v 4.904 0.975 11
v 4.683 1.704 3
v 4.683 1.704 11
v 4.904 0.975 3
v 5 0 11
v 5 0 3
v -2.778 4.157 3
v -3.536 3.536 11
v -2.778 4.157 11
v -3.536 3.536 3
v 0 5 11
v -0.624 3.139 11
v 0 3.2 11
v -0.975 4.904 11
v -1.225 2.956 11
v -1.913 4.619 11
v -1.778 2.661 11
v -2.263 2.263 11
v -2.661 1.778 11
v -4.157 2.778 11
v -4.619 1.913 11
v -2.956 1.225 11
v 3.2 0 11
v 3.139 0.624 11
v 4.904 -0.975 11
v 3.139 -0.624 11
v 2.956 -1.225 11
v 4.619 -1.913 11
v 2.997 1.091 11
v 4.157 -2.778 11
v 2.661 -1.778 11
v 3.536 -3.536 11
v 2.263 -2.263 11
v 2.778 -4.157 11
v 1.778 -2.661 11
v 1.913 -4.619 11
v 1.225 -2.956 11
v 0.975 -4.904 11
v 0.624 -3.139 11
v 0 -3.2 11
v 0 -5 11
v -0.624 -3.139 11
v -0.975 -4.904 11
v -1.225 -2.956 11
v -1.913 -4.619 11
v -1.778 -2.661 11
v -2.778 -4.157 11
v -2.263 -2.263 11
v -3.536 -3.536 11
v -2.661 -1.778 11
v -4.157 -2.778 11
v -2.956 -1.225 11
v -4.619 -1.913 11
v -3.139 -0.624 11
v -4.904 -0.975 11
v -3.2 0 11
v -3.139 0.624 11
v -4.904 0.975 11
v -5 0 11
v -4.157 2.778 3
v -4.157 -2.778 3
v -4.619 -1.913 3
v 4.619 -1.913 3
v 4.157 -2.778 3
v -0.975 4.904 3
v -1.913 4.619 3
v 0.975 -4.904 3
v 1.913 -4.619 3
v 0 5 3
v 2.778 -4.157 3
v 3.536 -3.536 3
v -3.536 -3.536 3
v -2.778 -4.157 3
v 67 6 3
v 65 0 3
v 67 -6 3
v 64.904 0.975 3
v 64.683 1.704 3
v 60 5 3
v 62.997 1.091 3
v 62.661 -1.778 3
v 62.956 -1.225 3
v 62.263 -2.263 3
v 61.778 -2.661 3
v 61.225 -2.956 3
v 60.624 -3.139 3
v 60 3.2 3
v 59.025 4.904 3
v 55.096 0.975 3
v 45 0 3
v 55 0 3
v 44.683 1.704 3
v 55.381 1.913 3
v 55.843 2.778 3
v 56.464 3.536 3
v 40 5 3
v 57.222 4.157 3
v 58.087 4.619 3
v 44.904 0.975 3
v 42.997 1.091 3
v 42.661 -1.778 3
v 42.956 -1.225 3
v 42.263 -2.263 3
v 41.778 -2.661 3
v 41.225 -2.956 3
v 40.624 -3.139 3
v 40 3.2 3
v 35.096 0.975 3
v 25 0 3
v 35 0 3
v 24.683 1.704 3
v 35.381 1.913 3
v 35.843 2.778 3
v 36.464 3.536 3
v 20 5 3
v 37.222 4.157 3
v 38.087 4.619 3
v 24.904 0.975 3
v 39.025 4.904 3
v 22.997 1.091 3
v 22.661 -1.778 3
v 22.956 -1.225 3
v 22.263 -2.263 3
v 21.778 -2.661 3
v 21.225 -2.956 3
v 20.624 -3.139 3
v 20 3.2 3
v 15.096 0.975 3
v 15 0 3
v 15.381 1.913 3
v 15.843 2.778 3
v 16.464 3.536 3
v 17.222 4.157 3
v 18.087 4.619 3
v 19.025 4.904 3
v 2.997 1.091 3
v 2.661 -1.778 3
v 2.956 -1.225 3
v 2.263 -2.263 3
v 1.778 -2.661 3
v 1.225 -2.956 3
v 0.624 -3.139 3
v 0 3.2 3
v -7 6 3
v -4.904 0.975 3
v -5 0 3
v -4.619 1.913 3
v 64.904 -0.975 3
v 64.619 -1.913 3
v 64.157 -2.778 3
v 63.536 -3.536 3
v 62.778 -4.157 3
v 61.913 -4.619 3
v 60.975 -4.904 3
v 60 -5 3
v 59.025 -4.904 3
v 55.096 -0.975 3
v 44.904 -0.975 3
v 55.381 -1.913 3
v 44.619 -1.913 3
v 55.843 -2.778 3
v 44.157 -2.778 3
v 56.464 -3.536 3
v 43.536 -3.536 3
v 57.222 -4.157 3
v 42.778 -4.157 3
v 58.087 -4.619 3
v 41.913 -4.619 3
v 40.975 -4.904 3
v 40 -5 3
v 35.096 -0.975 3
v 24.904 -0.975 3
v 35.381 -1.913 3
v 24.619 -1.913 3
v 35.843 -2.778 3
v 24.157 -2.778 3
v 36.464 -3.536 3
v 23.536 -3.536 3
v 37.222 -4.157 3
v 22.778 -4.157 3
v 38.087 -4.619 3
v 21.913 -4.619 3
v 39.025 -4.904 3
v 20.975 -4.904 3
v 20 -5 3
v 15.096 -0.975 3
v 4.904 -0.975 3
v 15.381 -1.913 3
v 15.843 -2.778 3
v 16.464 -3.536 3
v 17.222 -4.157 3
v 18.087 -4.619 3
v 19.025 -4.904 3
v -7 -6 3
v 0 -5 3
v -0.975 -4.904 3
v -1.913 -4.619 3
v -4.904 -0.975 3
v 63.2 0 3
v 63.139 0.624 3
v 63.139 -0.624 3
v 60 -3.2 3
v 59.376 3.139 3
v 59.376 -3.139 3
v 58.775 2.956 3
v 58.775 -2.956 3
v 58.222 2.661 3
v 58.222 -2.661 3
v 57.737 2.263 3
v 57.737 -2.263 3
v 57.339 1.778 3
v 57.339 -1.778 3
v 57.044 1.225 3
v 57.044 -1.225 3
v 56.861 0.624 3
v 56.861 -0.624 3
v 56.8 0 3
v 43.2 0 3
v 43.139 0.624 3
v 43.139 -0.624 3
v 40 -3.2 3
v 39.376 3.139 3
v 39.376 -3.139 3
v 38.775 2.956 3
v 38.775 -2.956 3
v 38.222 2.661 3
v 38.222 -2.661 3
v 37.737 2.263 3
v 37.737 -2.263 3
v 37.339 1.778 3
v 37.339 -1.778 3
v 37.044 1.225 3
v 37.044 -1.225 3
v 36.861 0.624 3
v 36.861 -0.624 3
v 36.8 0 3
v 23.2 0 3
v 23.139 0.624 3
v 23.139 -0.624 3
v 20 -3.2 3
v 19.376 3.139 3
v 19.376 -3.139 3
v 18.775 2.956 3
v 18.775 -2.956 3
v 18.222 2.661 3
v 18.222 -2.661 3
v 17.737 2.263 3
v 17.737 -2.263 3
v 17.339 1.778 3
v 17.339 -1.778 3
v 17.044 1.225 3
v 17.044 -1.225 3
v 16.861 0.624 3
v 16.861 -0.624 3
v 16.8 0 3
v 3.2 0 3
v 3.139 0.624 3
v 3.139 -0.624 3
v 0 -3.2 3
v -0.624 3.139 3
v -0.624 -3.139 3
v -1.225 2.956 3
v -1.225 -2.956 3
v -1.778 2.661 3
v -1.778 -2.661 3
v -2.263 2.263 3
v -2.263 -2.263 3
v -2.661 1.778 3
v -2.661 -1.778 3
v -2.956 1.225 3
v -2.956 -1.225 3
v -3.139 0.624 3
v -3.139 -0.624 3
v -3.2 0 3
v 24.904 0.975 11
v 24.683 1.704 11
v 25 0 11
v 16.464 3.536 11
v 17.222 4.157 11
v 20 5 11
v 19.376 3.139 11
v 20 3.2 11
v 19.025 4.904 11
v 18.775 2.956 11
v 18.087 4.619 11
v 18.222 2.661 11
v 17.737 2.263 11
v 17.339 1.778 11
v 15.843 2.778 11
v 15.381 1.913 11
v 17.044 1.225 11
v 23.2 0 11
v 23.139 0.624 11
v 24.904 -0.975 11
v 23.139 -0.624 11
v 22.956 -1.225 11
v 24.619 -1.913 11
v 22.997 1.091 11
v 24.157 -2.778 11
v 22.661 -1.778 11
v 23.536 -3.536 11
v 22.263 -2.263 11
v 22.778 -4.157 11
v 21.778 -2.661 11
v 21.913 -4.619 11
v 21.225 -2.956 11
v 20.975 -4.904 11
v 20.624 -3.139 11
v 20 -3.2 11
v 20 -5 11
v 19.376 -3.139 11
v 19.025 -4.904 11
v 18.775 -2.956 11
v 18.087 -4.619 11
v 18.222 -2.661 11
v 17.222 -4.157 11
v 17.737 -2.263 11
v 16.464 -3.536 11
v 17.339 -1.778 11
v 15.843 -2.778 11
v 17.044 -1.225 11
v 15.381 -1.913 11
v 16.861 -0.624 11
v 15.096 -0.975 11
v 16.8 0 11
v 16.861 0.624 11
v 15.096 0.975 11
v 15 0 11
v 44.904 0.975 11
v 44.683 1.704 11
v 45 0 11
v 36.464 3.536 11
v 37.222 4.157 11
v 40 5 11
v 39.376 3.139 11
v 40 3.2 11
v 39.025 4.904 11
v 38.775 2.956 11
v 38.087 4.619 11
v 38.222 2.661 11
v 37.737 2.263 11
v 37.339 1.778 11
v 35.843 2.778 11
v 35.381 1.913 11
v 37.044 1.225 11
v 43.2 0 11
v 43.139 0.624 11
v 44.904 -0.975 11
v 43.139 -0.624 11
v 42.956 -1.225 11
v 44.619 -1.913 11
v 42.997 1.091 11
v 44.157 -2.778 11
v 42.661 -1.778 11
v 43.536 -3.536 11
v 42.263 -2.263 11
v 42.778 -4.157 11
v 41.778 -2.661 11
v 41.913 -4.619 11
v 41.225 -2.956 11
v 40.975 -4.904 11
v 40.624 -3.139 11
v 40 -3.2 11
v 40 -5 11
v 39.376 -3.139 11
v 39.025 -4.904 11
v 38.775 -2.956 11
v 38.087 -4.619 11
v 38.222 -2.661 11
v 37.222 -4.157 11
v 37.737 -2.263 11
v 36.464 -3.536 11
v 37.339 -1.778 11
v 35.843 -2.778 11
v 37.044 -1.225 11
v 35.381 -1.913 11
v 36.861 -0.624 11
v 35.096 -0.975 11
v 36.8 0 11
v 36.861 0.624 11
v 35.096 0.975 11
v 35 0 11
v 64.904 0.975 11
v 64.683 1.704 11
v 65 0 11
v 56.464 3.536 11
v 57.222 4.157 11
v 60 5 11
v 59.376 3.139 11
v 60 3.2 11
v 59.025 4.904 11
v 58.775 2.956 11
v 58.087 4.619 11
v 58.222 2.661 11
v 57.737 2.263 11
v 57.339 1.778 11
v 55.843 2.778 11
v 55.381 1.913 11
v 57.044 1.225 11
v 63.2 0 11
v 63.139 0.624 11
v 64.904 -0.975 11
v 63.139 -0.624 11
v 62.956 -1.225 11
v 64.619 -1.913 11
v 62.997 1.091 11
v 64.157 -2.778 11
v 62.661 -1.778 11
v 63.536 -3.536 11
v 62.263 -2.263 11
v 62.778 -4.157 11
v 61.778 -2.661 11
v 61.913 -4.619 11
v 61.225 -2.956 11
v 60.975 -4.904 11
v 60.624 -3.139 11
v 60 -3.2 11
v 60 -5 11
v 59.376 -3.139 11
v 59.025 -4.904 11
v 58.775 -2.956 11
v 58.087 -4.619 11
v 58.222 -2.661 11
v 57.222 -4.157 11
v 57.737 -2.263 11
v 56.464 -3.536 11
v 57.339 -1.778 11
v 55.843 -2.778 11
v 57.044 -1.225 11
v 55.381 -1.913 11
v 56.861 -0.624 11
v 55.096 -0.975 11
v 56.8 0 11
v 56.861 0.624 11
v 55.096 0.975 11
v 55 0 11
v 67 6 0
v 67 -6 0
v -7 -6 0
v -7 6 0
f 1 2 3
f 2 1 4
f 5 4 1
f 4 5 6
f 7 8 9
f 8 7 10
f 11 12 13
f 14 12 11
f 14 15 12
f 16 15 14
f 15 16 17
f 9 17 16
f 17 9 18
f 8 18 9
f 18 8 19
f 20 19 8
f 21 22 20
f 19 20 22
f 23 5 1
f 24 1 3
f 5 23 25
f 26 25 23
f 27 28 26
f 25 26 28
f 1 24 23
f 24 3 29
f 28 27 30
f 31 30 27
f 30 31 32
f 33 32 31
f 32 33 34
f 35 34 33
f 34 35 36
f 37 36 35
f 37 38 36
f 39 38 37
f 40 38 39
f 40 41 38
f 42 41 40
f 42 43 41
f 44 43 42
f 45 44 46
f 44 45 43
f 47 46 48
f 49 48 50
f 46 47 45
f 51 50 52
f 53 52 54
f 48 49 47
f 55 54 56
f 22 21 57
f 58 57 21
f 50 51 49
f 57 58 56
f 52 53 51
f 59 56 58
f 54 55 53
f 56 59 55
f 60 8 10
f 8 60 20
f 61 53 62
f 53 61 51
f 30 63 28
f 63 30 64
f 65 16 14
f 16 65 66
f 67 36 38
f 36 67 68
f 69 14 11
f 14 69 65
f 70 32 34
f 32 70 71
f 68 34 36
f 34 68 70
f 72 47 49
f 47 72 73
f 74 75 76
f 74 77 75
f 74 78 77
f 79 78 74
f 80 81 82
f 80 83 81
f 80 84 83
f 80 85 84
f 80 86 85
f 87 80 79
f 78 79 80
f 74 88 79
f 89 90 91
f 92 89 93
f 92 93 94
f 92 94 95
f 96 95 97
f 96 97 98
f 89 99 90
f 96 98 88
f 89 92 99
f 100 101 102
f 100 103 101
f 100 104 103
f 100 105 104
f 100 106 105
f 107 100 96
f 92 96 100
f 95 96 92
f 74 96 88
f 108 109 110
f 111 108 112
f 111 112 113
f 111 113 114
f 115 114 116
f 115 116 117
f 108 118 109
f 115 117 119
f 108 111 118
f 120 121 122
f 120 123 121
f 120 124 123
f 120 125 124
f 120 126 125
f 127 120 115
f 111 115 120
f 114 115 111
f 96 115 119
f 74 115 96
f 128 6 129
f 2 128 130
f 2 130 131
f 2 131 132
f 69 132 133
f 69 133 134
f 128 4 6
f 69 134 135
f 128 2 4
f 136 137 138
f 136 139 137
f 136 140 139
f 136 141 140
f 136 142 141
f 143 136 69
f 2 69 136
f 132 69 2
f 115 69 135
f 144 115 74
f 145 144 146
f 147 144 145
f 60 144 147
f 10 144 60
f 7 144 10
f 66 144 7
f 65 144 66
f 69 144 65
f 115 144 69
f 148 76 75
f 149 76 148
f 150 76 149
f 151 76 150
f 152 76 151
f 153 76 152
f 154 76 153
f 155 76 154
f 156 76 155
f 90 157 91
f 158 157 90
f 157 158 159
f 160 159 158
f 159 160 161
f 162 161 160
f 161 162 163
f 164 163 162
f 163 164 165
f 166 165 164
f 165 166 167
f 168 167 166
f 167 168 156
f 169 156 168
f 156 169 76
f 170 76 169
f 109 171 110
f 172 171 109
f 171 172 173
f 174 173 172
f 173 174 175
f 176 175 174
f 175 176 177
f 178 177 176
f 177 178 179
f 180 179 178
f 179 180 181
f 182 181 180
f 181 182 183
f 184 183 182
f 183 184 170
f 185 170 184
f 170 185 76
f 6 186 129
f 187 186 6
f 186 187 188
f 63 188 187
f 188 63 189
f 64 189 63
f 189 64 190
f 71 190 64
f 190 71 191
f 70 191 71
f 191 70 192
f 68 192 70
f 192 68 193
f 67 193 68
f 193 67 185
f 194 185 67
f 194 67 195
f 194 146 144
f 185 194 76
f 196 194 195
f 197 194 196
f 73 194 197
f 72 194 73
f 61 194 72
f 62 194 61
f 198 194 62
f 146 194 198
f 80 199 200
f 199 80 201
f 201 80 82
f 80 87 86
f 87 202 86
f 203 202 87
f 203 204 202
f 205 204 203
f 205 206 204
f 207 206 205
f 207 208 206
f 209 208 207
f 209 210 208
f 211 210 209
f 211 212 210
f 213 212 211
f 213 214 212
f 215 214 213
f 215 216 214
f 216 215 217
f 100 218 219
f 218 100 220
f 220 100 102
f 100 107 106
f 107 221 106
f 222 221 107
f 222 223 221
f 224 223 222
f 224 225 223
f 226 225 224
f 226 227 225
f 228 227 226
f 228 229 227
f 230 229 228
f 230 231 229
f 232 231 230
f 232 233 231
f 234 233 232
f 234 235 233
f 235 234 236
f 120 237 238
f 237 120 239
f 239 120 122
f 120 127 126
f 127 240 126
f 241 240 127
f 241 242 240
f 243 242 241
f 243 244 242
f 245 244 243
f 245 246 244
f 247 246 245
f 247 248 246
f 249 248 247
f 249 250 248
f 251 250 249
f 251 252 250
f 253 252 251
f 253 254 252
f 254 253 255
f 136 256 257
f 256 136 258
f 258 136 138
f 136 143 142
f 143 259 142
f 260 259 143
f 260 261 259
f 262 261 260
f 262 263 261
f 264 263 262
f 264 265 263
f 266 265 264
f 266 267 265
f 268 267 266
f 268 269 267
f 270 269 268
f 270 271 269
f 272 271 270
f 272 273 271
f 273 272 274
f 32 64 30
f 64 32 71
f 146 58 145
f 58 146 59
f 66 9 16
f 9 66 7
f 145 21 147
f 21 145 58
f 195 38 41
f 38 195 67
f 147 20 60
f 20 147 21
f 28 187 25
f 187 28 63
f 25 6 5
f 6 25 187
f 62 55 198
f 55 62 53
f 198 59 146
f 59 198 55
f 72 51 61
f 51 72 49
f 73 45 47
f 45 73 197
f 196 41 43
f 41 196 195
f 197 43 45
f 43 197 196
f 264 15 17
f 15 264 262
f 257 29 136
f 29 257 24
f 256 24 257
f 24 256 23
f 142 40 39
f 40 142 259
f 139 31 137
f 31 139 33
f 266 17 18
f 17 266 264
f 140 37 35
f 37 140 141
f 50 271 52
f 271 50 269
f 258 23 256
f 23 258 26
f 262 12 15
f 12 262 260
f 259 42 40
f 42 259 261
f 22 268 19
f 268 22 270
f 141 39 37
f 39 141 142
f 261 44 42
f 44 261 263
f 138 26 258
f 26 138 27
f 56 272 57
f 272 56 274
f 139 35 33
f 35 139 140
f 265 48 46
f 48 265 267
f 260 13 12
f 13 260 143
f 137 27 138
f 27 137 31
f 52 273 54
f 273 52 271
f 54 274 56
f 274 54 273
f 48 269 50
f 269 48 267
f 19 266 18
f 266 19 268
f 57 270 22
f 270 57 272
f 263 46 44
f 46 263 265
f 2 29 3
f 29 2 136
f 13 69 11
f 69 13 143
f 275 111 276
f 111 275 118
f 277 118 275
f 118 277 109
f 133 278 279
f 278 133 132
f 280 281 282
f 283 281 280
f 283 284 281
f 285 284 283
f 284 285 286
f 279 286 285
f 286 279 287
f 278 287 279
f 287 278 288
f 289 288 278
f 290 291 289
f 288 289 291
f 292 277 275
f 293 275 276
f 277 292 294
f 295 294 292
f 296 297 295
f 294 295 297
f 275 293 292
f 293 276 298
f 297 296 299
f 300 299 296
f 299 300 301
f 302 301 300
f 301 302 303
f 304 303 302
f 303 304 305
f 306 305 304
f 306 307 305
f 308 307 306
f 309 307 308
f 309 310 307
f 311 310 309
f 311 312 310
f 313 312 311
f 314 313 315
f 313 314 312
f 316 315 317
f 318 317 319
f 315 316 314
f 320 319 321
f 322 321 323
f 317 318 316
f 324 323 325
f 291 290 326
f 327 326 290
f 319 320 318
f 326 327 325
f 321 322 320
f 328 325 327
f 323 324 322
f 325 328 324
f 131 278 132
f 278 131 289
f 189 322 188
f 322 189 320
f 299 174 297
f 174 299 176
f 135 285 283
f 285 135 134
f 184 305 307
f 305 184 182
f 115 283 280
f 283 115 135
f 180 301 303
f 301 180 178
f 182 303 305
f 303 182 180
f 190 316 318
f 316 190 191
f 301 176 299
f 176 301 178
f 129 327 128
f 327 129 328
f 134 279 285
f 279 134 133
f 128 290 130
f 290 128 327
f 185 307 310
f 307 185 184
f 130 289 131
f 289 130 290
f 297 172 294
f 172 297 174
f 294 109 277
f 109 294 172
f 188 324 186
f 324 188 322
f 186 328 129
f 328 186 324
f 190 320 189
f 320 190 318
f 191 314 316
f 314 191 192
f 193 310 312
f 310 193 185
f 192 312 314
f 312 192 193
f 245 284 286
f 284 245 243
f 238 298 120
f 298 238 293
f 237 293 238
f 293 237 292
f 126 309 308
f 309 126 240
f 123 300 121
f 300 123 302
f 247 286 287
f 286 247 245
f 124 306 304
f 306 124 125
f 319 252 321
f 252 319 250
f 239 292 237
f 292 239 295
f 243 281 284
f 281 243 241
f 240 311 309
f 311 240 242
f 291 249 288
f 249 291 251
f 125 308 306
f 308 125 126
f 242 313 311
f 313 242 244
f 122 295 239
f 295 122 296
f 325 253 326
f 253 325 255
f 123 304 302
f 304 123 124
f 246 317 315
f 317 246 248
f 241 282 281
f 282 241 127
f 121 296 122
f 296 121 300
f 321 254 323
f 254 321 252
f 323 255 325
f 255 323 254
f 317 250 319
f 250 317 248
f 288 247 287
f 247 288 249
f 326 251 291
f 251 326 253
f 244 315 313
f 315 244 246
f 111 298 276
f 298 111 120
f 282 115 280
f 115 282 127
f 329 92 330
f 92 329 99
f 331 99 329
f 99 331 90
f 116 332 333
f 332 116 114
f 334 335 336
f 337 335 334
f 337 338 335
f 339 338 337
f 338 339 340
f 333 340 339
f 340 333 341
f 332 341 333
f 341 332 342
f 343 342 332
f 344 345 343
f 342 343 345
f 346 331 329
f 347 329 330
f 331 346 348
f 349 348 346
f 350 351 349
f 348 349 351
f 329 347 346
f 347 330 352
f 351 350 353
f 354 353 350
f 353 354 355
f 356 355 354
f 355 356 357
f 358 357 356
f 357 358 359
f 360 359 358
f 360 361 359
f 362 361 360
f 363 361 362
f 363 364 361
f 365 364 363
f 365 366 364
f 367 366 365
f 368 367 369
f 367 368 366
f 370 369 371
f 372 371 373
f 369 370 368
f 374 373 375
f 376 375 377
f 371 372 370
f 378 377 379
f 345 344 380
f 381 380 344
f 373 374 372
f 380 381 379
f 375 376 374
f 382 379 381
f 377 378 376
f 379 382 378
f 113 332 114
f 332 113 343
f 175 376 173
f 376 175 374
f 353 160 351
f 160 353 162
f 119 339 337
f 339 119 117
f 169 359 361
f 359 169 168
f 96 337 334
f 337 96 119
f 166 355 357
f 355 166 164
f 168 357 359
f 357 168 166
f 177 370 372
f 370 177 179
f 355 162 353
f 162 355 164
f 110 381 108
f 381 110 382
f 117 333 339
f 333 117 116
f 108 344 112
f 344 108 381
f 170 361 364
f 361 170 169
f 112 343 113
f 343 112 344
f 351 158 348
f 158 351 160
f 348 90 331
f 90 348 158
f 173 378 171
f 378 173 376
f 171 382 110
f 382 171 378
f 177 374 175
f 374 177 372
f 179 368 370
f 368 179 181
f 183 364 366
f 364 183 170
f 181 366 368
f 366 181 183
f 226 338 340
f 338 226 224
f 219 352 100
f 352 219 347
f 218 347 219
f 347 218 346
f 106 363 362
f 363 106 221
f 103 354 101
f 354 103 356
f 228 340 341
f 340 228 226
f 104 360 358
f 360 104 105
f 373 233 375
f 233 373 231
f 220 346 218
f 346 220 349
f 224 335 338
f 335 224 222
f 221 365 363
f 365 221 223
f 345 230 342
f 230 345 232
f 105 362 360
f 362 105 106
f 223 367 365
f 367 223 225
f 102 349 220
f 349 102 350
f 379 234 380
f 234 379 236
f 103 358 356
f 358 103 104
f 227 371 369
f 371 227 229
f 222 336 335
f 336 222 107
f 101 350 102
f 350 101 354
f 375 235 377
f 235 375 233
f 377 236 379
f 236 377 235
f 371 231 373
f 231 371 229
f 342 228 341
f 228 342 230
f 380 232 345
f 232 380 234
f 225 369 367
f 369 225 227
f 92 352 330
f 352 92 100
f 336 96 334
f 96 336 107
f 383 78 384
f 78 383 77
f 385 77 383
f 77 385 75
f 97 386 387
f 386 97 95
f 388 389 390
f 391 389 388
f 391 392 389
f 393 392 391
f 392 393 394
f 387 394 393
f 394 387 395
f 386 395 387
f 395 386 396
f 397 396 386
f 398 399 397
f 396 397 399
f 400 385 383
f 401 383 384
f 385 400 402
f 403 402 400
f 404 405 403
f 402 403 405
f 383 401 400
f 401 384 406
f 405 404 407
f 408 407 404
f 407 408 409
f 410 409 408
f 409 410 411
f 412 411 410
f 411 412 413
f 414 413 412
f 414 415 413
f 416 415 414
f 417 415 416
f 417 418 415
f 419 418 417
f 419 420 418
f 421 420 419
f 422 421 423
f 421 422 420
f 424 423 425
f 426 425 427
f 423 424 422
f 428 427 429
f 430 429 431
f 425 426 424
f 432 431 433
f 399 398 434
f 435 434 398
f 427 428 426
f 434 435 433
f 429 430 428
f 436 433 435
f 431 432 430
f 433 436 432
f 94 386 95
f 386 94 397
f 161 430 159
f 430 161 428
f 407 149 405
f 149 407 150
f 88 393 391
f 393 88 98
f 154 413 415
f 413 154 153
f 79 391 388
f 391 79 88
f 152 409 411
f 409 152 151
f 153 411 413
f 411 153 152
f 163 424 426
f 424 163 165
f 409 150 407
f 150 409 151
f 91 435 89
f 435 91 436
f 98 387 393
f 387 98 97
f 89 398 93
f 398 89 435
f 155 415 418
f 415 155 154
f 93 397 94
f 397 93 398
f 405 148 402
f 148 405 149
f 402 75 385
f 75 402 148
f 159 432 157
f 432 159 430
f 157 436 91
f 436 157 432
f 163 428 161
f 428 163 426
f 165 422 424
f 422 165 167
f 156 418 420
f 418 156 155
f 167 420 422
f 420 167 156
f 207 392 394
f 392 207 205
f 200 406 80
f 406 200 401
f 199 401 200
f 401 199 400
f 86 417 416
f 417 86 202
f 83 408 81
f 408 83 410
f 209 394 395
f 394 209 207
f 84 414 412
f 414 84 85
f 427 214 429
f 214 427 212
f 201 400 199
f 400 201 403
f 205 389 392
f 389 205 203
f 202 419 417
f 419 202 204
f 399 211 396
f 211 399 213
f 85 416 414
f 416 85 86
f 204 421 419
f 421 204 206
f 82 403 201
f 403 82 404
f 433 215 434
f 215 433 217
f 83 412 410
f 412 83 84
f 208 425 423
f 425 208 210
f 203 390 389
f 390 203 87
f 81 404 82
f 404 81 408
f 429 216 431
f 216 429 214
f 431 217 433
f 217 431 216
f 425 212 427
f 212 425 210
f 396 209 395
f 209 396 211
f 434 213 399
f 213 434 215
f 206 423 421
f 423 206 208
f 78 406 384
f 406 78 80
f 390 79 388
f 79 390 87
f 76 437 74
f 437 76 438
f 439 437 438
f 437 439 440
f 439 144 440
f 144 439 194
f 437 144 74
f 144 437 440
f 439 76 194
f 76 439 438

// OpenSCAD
// ============================================
// PARAMETRIC CABLE CLIP
// Desktop cable management clips
// ============================================

/* [Cable Settings] */
cable_diameter = 6;     // Diameter of cable to hold
clip_count = 4;         // Number of clips in strip

/* [Clip Design] */
clip_style = "c";       // [c:C-Clip, loop:Full Loop, slot:Slot Entry]
opening_angle = 70;     // Opening angle for C-clip style (degrees)

/* [Base Settings] */
base_style = "flat";    // [flat:Flat Base, adhesive:Adhesive Pad, screw:Screw Mount]
spacing = 20;           // Distance between clip centers

/* [Advanced] */
wall = 2;               // Clip wall thickness
base_height = 3;        // Base platform height

/* [Hidden] */
$fn = $preview ? 24 : 48;
epsilon = 0.01;

// ============================================
// CALCULATED VALUES
// ============================================

clip_outer_d = cable_diameter + 2 * wall;
clip_height = clip_outer_d * 0.8;
base_width = clip_outer_d + 4;
base_depth = clip_outer_d + 2;
total_width = (clip_count - 1) * spacing + base_width;

// Cable hole is slightly larger for easy insertion
cable_hole_d = cable_diameter + 0.4;

// ============================================
// VALIDATION
// ============================================

assert(cable_diameter >= 2, "Cable diameter must be at least 2mm");
assert(wall >= 1.2, "Wall thickness must be at least 1.2mm");
assert(clip_count >= 1 && clip_count <= 10, "Clip count should be 1-10");
assert(opening_angle >= 45 && opening_angle <= 120, "Opening angle should be 45-120 degrees");

// ============================================
// MODULES
// ============================================

module clip_c_style() {
    difference() {
        // Outer cylinder
        cylinder(d = clip_outer_d, h = clip_height, $fn = 32);

        // Inner hole
        translate([0, 0, -epsilon])
            cylinder(d = cable_hole_d, h = clip_height + 2*epsilon, $fn = 32);

        // Opening wedge
        rotate([0, 0, 90 - opening_angle/2])
            translate([0, 0, -epsilon])
            linear_extrude(clip_height + 2*epsilon)
            polygon([
                [0, 0],
                [clip_outer_d, clip_outer_d * tan(opening_angle/2)],
                [clip_outer_d, -clip_outer_d * tan(opening_angle/2)]
            ]);
    }
}

module clip_loop_style() {
    difference() {
        // Outer cylinder
        cylinder(d = clip_outer_d, h = clip_height, $fn = 32);

        // Inner hole
        translate([0, 0, -epsilon])
            cylinder(d = cable_hole_d, h = clip_height + 2*epsilon, $fn = 32);
    }

    // Entry ramp (printed as bridge)
    entry_width = cable_hole_d * 0.8;
    translate([-entry_width/2, clip_outer_d/2 - wall, 0])
        cube([entry_width, wall + 2, clip_height]);
}

module clip_slot_style() {
    slot_width = cable_diameter * 0.7;

    difference() {
        // Outer cylinder
        cylinder(d = clip_outer_d, h = clip_height, $fn = 32);

        // Inner hole
        translate([0, 0, -epsilon])
            cylinder(d = cable_hole_d, h = clip_height + 2*epsilon, $fn = 32);

        // Vertical entry slot
        translate([-slot_width/2, 0, -epsilon])
            cube([slot_width, clip_outer_d, clip_height + 2*epsilon]);
    }

    // Flexible retention lips
    lip_thickness = 1.0;
    for (x = [-1, 1]) {
        translate([x * (slot_width/2 + lip_thickness/2), cable_hole_d/2 - 1, 0])
            cube([lip_thickness, 2, clip_height]);
    }
}

module single_clip() {
    // Base platform
    translate([-base_width/2, -base_depth/2, 0])
        cube([base_width, base_depth, base_height]);

    // Clip body
    translate([0, 0, base_height])
        if (clip_style == "c") {
            clip_c_style();
        } else if (clip_style == "loop") {
            clip_loop_style();
        } else if (clip_style == "slot") {
            clip_slot_style();
        }
}

module base_flat() {
    // Simple flat base connecting all clips
    translate([-base_width/2, -base_depth/2, 0])
        cube([total_width, base_depth, base_height]);
}

module base_adhesive() {
    // Thin base optimized for adhesive tape
    translate([-base_width/2, -base_depth/2, 0])
        cube([total_width, base_depth, 1.5]);

    // Raised platforms under clips
    for (i = [0 : clip_count - 1]) {
        translate([i * spacing - base_width/2 + 2, -base_depth/2 + 2, 0])
            cube([base_width - 4, base_depth - 4, base_height]);
    }
}

module base_screw() {
    difference() {
        // Thicker base for screw holes
        translate([-base_width/2, -base_depth/2, 0])
            cube([total_width, base_depth, base_height + 1]);

        // Countersunk screw holes at ends
        for (x = [base_width/2, total_width - base_width/2]) {
            translate([x - base_width/2, 0, -epsilon])
                cylinder(d = 3.4, h = base_height + 2, $fn = 24);
            translate([x - base_width/2, 0, base_height - 1])
                cylinder(d1 = 3.4, d2 = 7, h = 2 + epsilon, $fn = 24);
        }
    }
}

module cable_clip_strip() {
    difference() {
        union() {
            // Base
            if (base_style == "flat") {
                base_flat();
            } else if (base_style == "adhesive") {
                base_adhesive();
            } else if (base_style == "screw") {
                base_screw();
            }

            // Clips
            for (i = [0 : clip_count - 1]) {
                translate([i * spacing, 0, 0])
                    translate([0, 0, base_height])
                    if (clip_style == "c") {
                        clip_c_style();
                    } else if (clip_style == "loop") {
                        clip_loop_style();
                    } else if (clip_style == "slot") {
                        clip_slot_style();
                    }
            }
        }
    }
}

// ============================================
// RENDER
// ============================================

color("DimGray")
cable_clip_strip();

// ============================================
// INFO OUTPUT
// ============================================

echo(str("=== Cable Clip Strip ==="));
echo(str("Cable diameter: ", cable_diameter, " mm"));
echo(str("Clip style: ", clip_style));
echo(str("Clips: ", clip_count, " at ", spacing, "mm spacing"));
echo(str("Total length: ", total_width, " mm"));
echo(str("Base style: ", base_style));
